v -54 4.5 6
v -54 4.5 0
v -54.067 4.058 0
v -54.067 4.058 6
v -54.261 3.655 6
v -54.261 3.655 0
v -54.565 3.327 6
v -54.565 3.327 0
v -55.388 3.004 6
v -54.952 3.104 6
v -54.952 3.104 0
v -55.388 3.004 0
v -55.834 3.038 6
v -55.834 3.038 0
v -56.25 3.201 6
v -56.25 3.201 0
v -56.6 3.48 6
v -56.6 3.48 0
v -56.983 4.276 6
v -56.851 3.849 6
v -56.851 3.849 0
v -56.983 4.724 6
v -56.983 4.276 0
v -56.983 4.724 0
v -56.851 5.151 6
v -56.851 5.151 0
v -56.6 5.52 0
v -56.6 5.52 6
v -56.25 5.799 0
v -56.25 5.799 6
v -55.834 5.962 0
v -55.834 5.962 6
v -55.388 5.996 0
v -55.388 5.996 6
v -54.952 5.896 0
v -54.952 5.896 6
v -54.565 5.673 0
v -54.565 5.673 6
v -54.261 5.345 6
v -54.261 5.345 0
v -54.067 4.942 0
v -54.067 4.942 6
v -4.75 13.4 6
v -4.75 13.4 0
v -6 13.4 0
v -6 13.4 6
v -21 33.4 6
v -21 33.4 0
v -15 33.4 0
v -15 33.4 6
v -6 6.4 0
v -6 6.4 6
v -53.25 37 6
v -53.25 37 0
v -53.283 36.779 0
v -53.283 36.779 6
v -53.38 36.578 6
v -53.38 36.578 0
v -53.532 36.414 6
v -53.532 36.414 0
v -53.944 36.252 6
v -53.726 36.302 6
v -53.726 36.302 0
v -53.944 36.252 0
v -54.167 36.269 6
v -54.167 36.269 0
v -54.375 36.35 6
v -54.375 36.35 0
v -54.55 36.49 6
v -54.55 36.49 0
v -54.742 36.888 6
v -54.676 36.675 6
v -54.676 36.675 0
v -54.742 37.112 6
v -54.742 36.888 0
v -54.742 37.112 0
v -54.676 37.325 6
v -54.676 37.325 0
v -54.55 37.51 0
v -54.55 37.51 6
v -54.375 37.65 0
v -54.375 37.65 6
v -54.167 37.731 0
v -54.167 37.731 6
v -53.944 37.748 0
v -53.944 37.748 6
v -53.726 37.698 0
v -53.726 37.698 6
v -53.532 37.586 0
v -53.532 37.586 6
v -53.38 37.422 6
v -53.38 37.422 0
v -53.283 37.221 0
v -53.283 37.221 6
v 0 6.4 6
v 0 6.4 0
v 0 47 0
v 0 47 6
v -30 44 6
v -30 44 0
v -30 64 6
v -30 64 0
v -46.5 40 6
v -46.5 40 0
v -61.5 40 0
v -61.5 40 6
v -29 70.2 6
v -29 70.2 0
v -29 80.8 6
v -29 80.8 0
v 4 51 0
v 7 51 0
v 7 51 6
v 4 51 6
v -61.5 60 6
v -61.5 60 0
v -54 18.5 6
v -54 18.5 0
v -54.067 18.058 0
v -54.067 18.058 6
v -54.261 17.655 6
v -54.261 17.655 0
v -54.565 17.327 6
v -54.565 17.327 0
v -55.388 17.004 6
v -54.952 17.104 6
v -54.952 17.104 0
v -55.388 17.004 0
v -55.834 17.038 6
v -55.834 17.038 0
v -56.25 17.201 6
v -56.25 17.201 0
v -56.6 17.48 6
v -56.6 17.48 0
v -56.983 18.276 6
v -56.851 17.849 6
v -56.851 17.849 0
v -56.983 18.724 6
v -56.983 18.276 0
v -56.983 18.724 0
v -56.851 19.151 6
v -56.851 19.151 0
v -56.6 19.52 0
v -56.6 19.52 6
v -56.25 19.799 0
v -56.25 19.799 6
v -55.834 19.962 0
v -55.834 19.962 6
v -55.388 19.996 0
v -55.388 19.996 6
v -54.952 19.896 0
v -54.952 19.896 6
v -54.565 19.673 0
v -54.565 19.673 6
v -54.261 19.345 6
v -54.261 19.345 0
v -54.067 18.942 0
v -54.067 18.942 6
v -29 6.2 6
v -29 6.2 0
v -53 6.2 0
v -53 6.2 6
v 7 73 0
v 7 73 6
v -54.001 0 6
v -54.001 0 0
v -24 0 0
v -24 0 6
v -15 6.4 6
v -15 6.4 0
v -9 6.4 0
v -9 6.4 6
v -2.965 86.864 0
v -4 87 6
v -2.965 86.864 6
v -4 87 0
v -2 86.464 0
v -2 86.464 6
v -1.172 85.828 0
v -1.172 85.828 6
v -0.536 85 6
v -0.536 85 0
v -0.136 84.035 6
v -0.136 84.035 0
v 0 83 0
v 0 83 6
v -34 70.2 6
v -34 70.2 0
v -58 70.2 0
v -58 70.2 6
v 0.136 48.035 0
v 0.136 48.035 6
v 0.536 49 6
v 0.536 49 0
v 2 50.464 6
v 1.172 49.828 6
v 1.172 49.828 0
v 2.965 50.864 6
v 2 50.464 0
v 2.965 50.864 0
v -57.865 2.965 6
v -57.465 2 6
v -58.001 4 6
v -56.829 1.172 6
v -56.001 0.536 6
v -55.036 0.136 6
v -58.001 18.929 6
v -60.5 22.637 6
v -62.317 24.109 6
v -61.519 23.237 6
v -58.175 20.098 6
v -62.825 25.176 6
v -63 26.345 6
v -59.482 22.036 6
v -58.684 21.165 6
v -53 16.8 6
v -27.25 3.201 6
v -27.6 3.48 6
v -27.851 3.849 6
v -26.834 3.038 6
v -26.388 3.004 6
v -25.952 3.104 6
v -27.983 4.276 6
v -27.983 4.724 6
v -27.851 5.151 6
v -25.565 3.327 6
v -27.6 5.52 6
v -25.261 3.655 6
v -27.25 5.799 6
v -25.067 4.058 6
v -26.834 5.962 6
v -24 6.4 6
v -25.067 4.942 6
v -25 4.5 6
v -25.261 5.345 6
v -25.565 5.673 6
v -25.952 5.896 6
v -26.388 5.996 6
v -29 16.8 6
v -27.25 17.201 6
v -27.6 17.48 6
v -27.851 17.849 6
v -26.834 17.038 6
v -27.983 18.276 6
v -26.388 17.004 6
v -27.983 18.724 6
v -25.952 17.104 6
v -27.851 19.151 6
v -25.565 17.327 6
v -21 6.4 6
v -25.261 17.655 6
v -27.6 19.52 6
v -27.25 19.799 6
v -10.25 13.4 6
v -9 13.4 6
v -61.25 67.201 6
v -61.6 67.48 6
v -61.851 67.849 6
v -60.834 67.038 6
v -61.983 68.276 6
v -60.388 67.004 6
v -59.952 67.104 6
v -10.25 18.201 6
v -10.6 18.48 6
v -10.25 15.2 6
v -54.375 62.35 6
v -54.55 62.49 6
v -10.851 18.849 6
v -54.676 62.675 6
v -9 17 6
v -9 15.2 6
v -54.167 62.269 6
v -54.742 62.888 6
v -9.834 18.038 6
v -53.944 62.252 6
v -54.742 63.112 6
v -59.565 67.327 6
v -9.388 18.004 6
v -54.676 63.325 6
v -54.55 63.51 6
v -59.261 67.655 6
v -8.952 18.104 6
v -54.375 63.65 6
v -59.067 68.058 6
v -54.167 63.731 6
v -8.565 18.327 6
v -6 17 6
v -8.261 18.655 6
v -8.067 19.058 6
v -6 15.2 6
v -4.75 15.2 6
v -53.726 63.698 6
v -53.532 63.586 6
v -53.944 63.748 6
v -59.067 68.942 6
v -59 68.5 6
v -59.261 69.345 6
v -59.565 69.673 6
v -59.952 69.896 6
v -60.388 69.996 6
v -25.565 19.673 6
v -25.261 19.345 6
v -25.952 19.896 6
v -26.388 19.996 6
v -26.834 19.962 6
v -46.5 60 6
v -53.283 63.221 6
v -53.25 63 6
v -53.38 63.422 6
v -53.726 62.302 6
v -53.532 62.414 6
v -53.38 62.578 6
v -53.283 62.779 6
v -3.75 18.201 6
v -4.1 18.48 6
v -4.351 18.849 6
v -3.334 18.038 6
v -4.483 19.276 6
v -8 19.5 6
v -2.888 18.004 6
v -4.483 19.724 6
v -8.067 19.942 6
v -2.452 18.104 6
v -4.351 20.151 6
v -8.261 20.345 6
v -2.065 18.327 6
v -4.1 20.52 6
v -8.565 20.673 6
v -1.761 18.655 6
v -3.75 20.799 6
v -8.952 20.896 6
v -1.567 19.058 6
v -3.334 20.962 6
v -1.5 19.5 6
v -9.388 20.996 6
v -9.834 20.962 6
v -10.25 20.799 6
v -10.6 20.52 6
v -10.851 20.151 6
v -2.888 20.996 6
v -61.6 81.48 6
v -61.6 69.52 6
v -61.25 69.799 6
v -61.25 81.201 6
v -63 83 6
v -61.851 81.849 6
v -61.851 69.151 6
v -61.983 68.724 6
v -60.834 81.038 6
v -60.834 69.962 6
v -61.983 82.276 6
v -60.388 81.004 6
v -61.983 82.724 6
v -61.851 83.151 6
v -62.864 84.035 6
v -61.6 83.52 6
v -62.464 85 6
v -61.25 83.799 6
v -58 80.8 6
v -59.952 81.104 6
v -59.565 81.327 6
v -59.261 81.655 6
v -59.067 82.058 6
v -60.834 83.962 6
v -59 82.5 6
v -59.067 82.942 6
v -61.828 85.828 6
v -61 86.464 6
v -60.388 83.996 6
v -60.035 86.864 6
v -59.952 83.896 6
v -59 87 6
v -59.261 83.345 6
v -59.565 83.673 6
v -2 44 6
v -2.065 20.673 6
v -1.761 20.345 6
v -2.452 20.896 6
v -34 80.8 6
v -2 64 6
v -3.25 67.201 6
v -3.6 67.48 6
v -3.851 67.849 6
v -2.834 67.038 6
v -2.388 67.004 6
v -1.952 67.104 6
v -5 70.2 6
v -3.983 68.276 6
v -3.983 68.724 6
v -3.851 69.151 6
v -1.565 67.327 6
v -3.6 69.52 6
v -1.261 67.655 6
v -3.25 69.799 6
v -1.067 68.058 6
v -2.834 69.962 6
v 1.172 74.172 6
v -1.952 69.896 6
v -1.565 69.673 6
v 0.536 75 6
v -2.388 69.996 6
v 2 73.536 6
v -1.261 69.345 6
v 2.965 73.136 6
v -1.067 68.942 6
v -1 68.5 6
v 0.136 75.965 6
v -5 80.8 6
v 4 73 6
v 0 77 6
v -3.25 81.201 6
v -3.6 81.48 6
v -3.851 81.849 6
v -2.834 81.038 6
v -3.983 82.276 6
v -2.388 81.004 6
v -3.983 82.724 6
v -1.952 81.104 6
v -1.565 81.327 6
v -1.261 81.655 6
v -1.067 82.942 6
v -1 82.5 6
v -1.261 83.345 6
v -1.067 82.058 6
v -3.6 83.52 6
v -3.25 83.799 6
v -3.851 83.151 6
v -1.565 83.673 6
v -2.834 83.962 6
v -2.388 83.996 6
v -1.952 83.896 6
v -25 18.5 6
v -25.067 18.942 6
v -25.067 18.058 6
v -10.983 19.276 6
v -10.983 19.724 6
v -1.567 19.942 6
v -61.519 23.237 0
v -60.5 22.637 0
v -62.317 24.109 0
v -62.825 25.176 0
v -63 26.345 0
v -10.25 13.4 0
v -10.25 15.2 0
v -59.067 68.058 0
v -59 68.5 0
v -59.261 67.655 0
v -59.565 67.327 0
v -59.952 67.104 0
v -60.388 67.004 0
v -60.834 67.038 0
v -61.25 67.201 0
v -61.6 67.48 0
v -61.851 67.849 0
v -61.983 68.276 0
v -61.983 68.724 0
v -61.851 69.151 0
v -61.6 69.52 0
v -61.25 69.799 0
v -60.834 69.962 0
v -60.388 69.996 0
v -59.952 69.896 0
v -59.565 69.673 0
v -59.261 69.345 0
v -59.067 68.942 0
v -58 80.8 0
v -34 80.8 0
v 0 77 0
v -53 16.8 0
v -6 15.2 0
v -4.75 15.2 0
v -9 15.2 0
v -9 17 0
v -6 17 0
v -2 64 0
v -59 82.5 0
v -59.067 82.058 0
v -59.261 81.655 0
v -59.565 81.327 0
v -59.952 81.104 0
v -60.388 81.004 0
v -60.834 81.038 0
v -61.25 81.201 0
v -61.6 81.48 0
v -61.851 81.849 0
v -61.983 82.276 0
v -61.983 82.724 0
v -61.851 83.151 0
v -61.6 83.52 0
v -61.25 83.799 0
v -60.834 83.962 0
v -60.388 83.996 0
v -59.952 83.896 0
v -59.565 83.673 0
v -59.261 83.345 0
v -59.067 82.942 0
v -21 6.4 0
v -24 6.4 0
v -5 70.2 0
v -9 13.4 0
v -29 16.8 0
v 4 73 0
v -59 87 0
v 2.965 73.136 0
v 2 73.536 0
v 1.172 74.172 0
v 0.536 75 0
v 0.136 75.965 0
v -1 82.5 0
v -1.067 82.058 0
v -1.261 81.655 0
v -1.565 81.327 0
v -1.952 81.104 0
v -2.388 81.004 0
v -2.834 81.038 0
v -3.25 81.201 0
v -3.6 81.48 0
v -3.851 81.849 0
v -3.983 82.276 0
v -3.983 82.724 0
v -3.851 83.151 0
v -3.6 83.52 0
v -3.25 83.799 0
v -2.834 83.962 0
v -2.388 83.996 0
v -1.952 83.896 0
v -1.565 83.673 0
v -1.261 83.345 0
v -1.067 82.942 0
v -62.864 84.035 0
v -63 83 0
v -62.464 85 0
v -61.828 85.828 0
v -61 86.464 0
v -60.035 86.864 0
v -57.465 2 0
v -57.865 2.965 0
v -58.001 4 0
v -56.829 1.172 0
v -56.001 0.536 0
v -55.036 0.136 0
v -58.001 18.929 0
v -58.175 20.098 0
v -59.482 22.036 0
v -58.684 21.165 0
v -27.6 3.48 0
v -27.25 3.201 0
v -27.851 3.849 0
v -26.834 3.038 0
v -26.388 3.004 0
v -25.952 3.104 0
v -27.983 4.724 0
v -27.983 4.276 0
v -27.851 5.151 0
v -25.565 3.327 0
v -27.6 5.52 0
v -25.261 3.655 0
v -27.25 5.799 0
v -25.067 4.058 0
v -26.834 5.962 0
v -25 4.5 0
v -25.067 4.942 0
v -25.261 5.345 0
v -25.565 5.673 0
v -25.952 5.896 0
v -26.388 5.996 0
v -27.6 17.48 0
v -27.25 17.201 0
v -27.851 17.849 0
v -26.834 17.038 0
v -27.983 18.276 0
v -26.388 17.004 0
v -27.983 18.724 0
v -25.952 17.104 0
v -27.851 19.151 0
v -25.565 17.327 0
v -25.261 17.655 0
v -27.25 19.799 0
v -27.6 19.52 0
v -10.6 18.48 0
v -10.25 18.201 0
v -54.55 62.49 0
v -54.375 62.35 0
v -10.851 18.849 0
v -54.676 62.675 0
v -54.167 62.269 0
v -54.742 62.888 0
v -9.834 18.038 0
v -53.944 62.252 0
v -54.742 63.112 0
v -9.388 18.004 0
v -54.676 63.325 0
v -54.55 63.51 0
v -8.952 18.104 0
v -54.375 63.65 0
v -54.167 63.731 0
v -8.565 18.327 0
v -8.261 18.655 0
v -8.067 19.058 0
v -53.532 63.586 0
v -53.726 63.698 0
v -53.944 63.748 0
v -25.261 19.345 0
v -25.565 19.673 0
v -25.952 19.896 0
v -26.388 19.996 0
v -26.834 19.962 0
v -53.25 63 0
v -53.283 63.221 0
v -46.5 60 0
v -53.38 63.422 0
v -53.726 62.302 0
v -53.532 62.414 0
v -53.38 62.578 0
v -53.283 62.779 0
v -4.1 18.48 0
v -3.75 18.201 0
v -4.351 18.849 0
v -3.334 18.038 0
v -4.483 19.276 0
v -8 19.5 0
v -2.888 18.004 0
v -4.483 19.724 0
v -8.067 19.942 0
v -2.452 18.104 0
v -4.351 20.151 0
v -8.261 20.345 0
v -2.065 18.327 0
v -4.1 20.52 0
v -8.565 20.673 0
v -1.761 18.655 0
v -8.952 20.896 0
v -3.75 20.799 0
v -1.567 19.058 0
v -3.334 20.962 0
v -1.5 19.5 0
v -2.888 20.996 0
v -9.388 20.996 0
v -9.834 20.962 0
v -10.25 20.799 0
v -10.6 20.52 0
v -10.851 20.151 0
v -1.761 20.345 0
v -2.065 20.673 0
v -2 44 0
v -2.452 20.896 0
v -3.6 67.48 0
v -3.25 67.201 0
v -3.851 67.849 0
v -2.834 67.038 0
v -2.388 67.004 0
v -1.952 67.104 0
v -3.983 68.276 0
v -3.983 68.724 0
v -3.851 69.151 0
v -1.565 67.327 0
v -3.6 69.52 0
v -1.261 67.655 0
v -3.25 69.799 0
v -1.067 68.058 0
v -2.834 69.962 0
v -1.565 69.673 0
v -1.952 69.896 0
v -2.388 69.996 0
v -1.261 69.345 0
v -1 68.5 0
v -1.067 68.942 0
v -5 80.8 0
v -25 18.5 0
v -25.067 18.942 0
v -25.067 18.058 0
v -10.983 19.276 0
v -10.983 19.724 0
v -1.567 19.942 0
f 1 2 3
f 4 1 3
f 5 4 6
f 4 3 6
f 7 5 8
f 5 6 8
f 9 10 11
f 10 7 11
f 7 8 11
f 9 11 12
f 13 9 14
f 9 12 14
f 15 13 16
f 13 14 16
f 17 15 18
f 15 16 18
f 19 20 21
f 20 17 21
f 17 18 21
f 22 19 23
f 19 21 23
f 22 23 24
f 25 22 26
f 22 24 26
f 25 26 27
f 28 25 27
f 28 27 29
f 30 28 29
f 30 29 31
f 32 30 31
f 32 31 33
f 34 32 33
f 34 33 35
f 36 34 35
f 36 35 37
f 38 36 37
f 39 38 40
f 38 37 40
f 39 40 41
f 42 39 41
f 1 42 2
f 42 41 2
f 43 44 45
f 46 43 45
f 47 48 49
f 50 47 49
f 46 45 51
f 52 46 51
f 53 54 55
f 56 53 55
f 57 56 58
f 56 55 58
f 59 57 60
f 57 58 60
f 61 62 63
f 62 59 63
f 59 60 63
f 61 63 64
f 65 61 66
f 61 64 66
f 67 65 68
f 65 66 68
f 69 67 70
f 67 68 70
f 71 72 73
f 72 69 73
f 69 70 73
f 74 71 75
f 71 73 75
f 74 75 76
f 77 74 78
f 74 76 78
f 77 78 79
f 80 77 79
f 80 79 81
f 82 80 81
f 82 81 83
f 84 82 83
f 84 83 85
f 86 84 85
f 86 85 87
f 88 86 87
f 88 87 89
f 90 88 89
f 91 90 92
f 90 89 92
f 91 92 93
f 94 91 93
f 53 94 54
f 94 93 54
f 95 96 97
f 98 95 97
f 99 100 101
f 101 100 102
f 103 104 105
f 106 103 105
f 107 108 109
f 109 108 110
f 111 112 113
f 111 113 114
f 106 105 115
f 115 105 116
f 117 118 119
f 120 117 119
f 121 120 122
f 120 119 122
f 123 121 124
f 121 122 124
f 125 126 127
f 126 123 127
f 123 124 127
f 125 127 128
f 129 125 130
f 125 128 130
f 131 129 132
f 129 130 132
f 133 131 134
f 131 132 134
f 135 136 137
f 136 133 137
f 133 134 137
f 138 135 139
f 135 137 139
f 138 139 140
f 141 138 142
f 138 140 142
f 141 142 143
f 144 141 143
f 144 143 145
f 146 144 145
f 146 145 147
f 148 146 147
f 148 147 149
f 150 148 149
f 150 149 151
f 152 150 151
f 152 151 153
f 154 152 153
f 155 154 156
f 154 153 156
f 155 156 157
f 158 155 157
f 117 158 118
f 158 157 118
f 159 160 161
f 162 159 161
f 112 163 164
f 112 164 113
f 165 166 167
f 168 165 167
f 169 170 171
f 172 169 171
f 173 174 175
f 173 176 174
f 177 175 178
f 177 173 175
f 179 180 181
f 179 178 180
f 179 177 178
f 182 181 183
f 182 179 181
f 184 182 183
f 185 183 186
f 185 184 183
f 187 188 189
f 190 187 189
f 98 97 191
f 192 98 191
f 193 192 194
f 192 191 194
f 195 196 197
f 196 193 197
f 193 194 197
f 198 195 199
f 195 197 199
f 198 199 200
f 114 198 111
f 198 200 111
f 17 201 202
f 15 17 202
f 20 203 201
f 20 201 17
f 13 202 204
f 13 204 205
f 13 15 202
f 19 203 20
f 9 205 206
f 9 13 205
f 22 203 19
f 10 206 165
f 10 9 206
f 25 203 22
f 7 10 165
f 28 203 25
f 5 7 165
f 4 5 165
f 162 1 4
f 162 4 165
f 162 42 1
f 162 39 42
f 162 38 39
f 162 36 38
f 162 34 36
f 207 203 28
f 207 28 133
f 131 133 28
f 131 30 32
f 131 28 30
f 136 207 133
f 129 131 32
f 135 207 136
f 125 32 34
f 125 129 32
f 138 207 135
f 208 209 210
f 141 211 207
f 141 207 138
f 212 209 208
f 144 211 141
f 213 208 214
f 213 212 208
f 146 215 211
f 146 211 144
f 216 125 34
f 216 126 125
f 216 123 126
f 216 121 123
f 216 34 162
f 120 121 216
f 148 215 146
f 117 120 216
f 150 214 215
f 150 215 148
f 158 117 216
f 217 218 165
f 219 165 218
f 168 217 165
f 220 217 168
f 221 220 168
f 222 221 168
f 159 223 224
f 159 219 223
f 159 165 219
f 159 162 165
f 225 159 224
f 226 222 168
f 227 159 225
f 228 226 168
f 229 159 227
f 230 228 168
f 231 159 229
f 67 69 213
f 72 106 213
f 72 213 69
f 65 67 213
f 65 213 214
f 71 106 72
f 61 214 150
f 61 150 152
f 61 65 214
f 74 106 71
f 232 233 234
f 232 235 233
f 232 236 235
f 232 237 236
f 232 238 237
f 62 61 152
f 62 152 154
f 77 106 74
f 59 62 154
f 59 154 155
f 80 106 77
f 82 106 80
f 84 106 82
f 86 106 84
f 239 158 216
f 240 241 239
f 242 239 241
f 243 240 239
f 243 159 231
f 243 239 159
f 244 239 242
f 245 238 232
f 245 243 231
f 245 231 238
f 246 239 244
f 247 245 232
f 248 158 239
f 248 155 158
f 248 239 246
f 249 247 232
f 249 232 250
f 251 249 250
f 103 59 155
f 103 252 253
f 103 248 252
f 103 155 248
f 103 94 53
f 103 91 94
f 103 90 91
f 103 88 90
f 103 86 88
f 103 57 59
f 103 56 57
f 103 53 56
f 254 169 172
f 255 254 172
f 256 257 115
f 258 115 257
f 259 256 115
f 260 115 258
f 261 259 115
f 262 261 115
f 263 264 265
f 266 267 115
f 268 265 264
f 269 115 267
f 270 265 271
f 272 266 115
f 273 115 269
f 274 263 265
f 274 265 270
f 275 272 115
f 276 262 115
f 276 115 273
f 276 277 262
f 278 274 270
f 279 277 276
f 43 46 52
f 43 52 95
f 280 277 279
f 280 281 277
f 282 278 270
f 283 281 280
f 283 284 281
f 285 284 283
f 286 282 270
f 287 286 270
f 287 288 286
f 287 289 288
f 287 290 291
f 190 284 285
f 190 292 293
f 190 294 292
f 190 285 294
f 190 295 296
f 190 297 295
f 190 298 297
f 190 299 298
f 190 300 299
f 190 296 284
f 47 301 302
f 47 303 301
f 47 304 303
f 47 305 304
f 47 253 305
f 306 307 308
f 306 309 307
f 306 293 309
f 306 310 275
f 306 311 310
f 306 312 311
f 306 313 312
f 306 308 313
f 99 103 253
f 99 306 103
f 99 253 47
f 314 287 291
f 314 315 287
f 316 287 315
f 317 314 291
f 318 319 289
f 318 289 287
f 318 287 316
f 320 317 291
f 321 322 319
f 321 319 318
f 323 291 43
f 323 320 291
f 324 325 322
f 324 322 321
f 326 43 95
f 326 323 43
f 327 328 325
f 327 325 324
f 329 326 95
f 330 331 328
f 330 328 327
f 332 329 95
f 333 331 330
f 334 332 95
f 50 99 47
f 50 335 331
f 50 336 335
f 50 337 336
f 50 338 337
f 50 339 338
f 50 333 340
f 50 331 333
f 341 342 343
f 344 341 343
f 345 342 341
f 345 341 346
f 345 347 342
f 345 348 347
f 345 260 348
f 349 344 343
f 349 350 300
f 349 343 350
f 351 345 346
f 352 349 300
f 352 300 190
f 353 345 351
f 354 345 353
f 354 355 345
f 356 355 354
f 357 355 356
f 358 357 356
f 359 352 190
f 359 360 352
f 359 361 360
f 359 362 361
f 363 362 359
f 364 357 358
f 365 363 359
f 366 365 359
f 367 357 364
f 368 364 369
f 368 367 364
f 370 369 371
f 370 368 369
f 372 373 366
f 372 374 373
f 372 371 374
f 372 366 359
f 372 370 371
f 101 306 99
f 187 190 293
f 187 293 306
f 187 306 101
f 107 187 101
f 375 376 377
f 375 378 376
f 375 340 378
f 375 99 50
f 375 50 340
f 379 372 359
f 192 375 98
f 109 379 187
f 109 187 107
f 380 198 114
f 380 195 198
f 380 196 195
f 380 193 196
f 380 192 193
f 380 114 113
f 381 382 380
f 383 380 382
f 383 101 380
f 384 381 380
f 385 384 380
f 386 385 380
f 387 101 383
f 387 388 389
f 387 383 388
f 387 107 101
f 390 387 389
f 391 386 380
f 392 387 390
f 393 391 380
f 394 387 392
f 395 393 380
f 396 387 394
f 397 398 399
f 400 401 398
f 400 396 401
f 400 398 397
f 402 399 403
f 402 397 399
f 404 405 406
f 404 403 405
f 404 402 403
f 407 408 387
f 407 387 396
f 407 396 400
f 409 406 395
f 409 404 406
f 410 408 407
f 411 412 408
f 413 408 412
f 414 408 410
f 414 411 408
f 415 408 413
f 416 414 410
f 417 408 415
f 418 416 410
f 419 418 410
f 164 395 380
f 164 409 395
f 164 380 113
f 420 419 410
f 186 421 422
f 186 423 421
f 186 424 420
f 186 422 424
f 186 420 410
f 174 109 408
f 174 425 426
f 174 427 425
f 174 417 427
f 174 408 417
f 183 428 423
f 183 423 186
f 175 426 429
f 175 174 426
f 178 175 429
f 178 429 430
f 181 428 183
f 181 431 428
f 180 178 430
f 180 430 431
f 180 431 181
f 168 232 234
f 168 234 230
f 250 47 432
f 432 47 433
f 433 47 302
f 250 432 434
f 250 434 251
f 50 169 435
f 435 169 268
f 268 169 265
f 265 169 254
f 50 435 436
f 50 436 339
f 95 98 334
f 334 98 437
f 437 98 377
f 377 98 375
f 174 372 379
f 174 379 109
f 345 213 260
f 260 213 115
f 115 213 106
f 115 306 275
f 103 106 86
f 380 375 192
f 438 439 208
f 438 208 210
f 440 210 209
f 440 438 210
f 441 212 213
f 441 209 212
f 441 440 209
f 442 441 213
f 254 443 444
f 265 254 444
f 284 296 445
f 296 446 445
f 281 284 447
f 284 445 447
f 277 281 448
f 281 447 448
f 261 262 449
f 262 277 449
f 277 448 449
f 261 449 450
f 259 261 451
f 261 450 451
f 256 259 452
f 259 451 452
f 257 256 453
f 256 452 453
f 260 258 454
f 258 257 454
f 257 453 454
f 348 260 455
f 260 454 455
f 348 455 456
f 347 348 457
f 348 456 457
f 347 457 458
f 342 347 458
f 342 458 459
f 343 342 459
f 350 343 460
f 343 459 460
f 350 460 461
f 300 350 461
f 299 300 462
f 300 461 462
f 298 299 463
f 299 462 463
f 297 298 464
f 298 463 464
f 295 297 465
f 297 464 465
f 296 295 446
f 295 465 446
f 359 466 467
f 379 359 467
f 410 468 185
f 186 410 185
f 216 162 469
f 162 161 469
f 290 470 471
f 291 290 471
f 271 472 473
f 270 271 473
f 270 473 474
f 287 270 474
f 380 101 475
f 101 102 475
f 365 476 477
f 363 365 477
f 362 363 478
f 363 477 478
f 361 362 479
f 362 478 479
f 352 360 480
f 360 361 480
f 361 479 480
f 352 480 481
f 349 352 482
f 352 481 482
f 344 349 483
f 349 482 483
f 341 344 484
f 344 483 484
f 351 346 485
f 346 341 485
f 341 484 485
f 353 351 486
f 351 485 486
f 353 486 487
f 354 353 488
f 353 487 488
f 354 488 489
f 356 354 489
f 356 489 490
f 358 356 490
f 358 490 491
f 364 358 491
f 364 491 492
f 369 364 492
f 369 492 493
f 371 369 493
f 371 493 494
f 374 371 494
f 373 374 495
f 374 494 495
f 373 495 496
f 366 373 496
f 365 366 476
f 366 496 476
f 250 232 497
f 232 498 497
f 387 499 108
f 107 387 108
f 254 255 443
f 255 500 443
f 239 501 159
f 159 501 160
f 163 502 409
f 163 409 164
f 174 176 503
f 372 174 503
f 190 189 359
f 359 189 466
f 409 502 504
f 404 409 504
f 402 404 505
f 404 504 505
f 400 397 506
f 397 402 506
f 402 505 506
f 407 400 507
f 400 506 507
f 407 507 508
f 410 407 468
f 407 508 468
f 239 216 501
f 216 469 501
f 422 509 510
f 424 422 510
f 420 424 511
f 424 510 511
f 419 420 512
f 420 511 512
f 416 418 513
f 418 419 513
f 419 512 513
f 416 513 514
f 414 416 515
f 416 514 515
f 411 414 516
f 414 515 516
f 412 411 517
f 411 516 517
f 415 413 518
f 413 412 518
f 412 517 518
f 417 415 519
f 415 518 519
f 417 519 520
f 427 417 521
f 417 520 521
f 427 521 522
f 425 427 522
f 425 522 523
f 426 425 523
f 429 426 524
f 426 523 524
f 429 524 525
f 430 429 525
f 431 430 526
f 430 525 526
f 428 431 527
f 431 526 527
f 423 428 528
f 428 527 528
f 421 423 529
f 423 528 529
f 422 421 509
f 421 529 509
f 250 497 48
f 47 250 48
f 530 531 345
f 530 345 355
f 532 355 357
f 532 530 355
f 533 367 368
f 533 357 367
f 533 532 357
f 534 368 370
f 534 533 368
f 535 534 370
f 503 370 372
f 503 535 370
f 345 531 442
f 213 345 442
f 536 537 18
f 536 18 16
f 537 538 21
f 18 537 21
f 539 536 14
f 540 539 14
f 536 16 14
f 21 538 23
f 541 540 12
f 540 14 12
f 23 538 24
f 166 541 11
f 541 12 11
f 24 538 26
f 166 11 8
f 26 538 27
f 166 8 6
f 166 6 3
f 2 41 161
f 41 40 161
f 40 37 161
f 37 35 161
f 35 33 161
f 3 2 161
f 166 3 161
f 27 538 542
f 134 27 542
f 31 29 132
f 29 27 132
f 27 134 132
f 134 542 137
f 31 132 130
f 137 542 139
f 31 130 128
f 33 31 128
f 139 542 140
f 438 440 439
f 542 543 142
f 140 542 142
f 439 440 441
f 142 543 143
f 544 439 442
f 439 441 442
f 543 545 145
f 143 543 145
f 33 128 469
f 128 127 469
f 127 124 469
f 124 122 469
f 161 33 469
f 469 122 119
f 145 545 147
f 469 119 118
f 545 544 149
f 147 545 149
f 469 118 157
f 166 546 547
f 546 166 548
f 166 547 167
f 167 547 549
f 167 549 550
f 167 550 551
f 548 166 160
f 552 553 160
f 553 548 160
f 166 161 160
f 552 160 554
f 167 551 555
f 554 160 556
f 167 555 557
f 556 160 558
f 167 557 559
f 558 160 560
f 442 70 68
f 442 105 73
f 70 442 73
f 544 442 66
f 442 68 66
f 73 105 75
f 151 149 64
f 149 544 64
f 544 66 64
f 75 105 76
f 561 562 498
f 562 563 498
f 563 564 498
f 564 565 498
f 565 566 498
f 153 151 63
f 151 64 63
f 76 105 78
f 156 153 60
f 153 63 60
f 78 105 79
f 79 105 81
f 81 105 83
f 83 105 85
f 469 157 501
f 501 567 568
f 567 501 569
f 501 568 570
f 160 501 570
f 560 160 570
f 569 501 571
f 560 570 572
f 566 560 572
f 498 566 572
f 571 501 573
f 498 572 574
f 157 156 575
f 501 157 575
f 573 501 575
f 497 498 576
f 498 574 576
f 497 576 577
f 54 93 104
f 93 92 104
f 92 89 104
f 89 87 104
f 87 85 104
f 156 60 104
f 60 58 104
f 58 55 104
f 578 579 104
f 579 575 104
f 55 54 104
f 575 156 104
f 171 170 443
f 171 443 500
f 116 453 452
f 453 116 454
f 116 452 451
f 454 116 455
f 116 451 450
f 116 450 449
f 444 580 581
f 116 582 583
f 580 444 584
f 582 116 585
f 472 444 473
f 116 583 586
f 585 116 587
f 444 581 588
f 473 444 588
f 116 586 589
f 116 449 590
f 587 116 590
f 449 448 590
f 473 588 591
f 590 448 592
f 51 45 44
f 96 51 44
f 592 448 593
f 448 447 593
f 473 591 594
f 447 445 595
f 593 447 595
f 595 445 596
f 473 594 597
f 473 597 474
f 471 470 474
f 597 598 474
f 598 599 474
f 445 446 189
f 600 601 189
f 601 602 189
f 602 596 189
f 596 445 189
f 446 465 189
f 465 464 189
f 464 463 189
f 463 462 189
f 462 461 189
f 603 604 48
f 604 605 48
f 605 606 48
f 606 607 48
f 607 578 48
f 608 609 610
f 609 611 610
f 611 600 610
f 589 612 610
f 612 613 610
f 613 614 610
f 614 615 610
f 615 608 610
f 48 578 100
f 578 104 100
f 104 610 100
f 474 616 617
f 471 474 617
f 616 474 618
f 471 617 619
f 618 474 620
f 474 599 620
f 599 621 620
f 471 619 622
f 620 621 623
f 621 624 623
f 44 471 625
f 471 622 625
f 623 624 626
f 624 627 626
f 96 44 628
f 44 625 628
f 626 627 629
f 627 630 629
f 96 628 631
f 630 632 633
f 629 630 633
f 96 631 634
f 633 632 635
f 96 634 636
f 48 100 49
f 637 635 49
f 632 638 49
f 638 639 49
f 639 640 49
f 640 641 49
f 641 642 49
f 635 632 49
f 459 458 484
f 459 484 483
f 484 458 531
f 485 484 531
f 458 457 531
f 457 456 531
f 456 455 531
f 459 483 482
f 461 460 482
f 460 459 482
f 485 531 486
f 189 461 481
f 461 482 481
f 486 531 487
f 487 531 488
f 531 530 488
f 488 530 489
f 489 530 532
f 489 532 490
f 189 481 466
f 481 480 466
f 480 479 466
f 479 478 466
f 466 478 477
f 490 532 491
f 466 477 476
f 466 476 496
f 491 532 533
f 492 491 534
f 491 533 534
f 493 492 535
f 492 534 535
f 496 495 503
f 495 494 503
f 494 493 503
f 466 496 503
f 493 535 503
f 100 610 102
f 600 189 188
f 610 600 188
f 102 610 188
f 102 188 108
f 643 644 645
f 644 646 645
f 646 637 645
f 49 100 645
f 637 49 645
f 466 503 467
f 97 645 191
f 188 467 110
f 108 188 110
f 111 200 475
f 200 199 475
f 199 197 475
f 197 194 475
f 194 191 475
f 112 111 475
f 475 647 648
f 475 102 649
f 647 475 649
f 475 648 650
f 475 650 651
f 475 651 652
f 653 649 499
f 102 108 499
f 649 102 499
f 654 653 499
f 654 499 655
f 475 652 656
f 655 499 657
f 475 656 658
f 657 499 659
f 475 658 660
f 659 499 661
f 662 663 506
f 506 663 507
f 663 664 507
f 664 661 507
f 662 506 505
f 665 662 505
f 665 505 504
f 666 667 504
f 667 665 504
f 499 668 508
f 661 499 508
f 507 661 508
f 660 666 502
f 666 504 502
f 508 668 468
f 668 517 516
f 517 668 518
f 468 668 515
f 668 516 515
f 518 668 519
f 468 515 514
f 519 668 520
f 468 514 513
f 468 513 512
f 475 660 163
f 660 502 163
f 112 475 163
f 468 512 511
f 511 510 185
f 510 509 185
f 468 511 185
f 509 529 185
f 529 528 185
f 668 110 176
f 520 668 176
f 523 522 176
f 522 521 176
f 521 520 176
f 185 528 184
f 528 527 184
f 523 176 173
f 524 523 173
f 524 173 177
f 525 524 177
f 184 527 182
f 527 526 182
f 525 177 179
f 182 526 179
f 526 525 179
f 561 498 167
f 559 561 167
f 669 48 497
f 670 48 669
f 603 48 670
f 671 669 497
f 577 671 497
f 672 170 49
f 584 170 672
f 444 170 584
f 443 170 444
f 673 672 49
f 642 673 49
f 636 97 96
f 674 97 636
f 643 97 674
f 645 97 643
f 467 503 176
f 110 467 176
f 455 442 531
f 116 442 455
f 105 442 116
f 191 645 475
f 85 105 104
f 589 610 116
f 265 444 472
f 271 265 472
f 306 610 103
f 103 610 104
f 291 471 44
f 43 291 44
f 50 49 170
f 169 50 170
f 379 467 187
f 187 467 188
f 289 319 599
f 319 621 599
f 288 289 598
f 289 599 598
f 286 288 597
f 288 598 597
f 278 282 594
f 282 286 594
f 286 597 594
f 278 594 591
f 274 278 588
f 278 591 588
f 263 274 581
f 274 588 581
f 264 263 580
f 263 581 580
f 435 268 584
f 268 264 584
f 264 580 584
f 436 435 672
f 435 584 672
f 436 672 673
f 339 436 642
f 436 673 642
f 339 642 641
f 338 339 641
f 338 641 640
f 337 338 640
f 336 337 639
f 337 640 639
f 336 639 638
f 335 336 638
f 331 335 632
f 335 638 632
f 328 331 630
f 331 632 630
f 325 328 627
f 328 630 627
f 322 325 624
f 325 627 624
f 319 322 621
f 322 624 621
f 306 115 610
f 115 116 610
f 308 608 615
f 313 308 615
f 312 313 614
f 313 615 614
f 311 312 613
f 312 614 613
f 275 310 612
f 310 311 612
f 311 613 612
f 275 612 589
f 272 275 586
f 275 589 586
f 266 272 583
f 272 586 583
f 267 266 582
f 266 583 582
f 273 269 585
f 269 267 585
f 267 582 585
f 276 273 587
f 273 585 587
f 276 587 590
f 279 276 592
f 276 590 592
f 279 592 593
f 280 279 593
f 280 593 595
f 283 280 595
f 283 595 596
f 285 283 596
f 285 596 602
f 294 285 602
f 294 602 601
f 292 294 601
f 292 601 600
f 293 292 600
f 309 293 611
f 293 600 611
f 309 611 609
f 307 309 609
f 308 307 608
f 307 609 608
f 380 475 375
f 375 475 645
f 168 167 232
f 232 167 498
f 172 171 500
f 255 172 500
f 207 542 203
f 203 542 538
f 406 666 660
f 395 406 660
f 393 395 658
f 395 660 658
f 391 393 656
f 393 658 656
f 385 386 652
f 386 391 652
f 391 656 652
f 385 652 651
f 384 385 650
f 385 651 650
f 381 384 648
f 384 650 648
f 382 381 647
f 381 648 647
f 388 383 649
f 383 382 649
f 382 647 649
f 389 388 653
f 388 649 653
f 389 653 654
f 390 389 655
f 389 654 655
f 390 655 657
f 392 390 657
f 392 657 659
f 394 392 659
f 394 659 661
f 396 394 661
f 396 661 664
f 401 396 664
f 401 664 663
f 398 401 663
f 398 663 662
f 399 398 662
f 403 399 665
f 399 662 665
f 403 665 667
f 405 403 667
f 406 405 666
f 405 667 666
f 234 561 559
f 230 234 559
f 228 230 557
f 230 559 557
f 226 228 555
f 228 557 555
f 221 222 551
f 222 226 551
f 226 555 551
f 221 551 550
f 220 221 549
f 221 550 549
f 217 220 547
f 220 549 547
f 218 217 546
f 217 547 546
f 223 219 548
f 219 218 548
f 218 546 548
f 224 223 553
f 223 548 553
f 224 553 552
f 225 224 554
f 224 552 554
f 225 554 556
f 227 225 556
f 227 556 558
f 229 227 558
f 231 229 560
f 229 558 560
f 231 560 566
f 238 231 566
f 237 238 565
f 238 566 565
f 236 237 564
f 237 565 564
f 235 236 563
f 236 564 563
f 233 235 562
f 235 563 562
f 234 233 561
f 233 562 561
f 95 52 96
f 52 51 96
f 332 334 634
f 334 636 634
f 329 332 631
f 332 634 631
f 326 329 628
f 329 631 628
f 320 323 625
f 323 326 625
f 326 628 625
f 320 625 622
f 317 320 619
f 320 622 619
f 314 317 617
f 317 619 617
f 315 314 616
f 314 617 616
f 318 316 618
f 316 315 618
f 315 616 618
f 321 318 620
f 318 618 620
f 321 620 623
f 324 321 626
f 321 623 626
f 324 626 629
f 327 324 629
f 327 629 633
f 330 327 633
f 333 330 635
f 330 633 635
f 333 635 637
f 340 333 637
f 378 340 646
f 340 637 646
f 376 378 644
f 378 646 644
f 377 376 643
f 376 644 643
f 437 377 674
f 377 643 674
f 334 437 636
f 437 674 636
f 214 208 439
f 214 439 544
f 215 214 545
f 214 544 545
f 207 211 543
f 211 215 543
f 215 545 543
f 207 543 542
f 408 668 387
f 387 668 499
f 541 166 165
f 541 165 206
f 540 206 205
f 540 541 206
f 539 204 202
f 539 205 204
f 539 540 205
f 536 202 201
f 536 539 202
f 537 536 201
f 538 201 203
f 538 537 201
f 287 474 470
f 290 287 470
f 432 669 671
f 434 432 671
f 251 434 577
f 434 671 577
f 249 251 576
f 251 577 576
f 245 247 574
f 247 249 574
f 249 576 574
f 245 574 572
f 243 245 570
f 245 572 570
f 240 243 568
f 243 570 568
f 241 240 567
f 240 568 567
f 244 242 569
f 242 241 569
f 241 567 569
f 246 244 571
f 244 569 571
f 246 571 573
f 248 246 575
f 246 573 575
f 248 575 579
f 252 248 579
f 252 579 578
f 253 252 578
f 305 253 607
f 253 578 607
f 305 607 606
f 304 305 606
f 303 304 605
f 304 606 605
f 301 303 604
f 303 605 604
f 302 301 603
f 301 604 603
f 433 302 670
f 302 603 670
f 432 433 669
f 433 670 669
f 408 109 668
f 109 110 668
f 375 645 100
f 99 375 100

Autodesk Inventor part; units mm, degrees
ref_plane "YZ Plane" through (0, 0, 0) normal (1, 0, 0) x (0, 1, 0)
ref_plane "XZ Plane" through (0, 0, 0) normal (0, 1, 0) x (-1, 0, 0)
ref_plane "XY Plane" through (0, 0, 0) normal (0, 0, 1) x (1, 0, 0)
sketch "Sketch1" plane through (0, 0, 0) normal (0, 0, 1) x (1, 0, 0)
  line L0 (-30, 44) -> (-30, 64)
  line L1 (-30, 64) -> (-2, 64)
  line L2 (-2, 64) -> (-2, 44)
  line L3 (-2, 44) -> (-30, 44)
  line L4 (-61.5, 40) -> (-61.5, 60)
  line L5 (-61.5, 60) -> (-46.5, 60)
  line L6 (-46.5, 60) -> (-46.5, 40)
  line L7 (-46.5, 40) -> (-61.5, 40)
  line L8 (-53, 6.2) -> (-53, 16.8)
  line L9 (-53, 16.8) -> (-29, 16.8)
  line L10 (-29, 16.8) -> (-29, 6.2)
  line L11 (-29, 6.2) -> (-53, 6.2)
  line L12 (-29, 70.2) -> (-29, 80.8)
  line L13 (-29, 80.8) -> (-5, 80.8)
  line L14 (-5, 80.8) -> (-5, 70.2)
  line L15 (-5, 70.2) -> (-29, 70.2)
  line L16 (-58, 70.2) -> (-58, 80.8)
  line L17 (-58, 80.8) -> (-34, 80.8)
  line L18 (-34, 80.8) -> (-34, 70.2)
  line L19 (-34, 70.2) -> (-58, 70.2)
  circle A0 centre (-3, 19.5) radius 1.5
  circle A1 centre (-9.5, 19.5) radius 1.5
  circle A2 centre (-26.5, 18.5) radius 1.5
  circle A3 centre (-26.5, 4.5) radius 1.5
  circle A4 centre (-55.5, 4.5) radius 1.5
  circle A5 centre (-55.5, 18.5) radius 1.5
  circle A6 centre (-2.5, 68.5) radius 1.5
  circle A7 centre (-60.5, 68.5) radius 1.5
  circle A8 centre (-60.5, 82.5) radius 1.5
  circle A9 centre (-2.5, 82.5) radius 1.5
  circle A10 centre (-54, 37) radius 0.75
  circle A11 centre (-54, 63) radius 0.75
  arc A12 (-63, 26.3448) -> (-60.5004, 22.6368) centre (-59, 26.3448) ccw
  arc A13 (-58.0008, 18.9289) -> (-60.5004, 22.6368) centre (-62.0008, 18.9289) ccw
  line L20 (-58.0008, 18.9289) -> (-58.0008, 4)
  arc A14 (-58.0008, 4) -> (-54.0008, 0) centre (-54.0008, 4) ccw
  line L21 (-54.0008, 0) -> (-24, 0)
  line L22 (-24, 0) -> (-24, 6.4)
  line L23 (-24, 6.4) -> (-21, 6.4)
  line L24 (-21, 6.4) -> (-21, 33.4)
  line L25 (-21, 33.4) -> (-15, 33.4)
  line L26 (-15, 33.4) -> (-15, 6.4)
  line L27 (-15, 6.4) -> (-9, 6.4)
  line L28 (-9, 6.4) -> (-9, 13.4)
  line L29 (-9, 13.4) -> (-10.25, 13.4)
  line L30 (-10.25, 13.4) -> (-10.25, 15.2)
  line L31 (-10.25, 15.2) -> (-9, 15.2)
  line L32 (-9, 15.2) -> (-9, 17)
  line L33 (-9, 17) -> (-6, 17)
  line L34 (-6, 17) -> (-6, 15.2)
  line L35 (-6, 15.2) -> (-4.75, 15.2)
  line L36 (-4.75, 15.2) -> (-4.75, 13.4)
  line L37 (-4.75, 13.4) -> (-6, 13.4)
  line L38 (-6, 13.4) -> (-6, 6.4)
  line L39 (-6, 6.4) -> (0, 6.4)
  line L40 (0, 6.4) -> (0, 47)
  arc A15 (4, 51) -> (0, 47) centre (4, 47) ccw
  line L41 (7, 51) -> (4, 51)
  line L42 (7, 73) -> (7, 51)
  line L43 (4, 73) -> (7, 73)
  arc A16 (0, 77) -> (4, 73) centre (4, 77) ccw
  line L44 (0, 77) -> (0, 83)
  arc A17 (0, 83) -> (-4, 87) centre (-4, 83) ccw
  line L45 (-4, 87) -> (-59, 87)
  arc A18 (-59, 87) -> (-63, 83) centre (-59, 83) ccw
  line L46 (-63, 83) -> (-63, 26.3448)
  point P0 (0, 0)
  point P1 (0, 0)
extrude "Extrusion1" add sketch "Sketch1" along normal blind 6
properties part number "yCarBottom"
